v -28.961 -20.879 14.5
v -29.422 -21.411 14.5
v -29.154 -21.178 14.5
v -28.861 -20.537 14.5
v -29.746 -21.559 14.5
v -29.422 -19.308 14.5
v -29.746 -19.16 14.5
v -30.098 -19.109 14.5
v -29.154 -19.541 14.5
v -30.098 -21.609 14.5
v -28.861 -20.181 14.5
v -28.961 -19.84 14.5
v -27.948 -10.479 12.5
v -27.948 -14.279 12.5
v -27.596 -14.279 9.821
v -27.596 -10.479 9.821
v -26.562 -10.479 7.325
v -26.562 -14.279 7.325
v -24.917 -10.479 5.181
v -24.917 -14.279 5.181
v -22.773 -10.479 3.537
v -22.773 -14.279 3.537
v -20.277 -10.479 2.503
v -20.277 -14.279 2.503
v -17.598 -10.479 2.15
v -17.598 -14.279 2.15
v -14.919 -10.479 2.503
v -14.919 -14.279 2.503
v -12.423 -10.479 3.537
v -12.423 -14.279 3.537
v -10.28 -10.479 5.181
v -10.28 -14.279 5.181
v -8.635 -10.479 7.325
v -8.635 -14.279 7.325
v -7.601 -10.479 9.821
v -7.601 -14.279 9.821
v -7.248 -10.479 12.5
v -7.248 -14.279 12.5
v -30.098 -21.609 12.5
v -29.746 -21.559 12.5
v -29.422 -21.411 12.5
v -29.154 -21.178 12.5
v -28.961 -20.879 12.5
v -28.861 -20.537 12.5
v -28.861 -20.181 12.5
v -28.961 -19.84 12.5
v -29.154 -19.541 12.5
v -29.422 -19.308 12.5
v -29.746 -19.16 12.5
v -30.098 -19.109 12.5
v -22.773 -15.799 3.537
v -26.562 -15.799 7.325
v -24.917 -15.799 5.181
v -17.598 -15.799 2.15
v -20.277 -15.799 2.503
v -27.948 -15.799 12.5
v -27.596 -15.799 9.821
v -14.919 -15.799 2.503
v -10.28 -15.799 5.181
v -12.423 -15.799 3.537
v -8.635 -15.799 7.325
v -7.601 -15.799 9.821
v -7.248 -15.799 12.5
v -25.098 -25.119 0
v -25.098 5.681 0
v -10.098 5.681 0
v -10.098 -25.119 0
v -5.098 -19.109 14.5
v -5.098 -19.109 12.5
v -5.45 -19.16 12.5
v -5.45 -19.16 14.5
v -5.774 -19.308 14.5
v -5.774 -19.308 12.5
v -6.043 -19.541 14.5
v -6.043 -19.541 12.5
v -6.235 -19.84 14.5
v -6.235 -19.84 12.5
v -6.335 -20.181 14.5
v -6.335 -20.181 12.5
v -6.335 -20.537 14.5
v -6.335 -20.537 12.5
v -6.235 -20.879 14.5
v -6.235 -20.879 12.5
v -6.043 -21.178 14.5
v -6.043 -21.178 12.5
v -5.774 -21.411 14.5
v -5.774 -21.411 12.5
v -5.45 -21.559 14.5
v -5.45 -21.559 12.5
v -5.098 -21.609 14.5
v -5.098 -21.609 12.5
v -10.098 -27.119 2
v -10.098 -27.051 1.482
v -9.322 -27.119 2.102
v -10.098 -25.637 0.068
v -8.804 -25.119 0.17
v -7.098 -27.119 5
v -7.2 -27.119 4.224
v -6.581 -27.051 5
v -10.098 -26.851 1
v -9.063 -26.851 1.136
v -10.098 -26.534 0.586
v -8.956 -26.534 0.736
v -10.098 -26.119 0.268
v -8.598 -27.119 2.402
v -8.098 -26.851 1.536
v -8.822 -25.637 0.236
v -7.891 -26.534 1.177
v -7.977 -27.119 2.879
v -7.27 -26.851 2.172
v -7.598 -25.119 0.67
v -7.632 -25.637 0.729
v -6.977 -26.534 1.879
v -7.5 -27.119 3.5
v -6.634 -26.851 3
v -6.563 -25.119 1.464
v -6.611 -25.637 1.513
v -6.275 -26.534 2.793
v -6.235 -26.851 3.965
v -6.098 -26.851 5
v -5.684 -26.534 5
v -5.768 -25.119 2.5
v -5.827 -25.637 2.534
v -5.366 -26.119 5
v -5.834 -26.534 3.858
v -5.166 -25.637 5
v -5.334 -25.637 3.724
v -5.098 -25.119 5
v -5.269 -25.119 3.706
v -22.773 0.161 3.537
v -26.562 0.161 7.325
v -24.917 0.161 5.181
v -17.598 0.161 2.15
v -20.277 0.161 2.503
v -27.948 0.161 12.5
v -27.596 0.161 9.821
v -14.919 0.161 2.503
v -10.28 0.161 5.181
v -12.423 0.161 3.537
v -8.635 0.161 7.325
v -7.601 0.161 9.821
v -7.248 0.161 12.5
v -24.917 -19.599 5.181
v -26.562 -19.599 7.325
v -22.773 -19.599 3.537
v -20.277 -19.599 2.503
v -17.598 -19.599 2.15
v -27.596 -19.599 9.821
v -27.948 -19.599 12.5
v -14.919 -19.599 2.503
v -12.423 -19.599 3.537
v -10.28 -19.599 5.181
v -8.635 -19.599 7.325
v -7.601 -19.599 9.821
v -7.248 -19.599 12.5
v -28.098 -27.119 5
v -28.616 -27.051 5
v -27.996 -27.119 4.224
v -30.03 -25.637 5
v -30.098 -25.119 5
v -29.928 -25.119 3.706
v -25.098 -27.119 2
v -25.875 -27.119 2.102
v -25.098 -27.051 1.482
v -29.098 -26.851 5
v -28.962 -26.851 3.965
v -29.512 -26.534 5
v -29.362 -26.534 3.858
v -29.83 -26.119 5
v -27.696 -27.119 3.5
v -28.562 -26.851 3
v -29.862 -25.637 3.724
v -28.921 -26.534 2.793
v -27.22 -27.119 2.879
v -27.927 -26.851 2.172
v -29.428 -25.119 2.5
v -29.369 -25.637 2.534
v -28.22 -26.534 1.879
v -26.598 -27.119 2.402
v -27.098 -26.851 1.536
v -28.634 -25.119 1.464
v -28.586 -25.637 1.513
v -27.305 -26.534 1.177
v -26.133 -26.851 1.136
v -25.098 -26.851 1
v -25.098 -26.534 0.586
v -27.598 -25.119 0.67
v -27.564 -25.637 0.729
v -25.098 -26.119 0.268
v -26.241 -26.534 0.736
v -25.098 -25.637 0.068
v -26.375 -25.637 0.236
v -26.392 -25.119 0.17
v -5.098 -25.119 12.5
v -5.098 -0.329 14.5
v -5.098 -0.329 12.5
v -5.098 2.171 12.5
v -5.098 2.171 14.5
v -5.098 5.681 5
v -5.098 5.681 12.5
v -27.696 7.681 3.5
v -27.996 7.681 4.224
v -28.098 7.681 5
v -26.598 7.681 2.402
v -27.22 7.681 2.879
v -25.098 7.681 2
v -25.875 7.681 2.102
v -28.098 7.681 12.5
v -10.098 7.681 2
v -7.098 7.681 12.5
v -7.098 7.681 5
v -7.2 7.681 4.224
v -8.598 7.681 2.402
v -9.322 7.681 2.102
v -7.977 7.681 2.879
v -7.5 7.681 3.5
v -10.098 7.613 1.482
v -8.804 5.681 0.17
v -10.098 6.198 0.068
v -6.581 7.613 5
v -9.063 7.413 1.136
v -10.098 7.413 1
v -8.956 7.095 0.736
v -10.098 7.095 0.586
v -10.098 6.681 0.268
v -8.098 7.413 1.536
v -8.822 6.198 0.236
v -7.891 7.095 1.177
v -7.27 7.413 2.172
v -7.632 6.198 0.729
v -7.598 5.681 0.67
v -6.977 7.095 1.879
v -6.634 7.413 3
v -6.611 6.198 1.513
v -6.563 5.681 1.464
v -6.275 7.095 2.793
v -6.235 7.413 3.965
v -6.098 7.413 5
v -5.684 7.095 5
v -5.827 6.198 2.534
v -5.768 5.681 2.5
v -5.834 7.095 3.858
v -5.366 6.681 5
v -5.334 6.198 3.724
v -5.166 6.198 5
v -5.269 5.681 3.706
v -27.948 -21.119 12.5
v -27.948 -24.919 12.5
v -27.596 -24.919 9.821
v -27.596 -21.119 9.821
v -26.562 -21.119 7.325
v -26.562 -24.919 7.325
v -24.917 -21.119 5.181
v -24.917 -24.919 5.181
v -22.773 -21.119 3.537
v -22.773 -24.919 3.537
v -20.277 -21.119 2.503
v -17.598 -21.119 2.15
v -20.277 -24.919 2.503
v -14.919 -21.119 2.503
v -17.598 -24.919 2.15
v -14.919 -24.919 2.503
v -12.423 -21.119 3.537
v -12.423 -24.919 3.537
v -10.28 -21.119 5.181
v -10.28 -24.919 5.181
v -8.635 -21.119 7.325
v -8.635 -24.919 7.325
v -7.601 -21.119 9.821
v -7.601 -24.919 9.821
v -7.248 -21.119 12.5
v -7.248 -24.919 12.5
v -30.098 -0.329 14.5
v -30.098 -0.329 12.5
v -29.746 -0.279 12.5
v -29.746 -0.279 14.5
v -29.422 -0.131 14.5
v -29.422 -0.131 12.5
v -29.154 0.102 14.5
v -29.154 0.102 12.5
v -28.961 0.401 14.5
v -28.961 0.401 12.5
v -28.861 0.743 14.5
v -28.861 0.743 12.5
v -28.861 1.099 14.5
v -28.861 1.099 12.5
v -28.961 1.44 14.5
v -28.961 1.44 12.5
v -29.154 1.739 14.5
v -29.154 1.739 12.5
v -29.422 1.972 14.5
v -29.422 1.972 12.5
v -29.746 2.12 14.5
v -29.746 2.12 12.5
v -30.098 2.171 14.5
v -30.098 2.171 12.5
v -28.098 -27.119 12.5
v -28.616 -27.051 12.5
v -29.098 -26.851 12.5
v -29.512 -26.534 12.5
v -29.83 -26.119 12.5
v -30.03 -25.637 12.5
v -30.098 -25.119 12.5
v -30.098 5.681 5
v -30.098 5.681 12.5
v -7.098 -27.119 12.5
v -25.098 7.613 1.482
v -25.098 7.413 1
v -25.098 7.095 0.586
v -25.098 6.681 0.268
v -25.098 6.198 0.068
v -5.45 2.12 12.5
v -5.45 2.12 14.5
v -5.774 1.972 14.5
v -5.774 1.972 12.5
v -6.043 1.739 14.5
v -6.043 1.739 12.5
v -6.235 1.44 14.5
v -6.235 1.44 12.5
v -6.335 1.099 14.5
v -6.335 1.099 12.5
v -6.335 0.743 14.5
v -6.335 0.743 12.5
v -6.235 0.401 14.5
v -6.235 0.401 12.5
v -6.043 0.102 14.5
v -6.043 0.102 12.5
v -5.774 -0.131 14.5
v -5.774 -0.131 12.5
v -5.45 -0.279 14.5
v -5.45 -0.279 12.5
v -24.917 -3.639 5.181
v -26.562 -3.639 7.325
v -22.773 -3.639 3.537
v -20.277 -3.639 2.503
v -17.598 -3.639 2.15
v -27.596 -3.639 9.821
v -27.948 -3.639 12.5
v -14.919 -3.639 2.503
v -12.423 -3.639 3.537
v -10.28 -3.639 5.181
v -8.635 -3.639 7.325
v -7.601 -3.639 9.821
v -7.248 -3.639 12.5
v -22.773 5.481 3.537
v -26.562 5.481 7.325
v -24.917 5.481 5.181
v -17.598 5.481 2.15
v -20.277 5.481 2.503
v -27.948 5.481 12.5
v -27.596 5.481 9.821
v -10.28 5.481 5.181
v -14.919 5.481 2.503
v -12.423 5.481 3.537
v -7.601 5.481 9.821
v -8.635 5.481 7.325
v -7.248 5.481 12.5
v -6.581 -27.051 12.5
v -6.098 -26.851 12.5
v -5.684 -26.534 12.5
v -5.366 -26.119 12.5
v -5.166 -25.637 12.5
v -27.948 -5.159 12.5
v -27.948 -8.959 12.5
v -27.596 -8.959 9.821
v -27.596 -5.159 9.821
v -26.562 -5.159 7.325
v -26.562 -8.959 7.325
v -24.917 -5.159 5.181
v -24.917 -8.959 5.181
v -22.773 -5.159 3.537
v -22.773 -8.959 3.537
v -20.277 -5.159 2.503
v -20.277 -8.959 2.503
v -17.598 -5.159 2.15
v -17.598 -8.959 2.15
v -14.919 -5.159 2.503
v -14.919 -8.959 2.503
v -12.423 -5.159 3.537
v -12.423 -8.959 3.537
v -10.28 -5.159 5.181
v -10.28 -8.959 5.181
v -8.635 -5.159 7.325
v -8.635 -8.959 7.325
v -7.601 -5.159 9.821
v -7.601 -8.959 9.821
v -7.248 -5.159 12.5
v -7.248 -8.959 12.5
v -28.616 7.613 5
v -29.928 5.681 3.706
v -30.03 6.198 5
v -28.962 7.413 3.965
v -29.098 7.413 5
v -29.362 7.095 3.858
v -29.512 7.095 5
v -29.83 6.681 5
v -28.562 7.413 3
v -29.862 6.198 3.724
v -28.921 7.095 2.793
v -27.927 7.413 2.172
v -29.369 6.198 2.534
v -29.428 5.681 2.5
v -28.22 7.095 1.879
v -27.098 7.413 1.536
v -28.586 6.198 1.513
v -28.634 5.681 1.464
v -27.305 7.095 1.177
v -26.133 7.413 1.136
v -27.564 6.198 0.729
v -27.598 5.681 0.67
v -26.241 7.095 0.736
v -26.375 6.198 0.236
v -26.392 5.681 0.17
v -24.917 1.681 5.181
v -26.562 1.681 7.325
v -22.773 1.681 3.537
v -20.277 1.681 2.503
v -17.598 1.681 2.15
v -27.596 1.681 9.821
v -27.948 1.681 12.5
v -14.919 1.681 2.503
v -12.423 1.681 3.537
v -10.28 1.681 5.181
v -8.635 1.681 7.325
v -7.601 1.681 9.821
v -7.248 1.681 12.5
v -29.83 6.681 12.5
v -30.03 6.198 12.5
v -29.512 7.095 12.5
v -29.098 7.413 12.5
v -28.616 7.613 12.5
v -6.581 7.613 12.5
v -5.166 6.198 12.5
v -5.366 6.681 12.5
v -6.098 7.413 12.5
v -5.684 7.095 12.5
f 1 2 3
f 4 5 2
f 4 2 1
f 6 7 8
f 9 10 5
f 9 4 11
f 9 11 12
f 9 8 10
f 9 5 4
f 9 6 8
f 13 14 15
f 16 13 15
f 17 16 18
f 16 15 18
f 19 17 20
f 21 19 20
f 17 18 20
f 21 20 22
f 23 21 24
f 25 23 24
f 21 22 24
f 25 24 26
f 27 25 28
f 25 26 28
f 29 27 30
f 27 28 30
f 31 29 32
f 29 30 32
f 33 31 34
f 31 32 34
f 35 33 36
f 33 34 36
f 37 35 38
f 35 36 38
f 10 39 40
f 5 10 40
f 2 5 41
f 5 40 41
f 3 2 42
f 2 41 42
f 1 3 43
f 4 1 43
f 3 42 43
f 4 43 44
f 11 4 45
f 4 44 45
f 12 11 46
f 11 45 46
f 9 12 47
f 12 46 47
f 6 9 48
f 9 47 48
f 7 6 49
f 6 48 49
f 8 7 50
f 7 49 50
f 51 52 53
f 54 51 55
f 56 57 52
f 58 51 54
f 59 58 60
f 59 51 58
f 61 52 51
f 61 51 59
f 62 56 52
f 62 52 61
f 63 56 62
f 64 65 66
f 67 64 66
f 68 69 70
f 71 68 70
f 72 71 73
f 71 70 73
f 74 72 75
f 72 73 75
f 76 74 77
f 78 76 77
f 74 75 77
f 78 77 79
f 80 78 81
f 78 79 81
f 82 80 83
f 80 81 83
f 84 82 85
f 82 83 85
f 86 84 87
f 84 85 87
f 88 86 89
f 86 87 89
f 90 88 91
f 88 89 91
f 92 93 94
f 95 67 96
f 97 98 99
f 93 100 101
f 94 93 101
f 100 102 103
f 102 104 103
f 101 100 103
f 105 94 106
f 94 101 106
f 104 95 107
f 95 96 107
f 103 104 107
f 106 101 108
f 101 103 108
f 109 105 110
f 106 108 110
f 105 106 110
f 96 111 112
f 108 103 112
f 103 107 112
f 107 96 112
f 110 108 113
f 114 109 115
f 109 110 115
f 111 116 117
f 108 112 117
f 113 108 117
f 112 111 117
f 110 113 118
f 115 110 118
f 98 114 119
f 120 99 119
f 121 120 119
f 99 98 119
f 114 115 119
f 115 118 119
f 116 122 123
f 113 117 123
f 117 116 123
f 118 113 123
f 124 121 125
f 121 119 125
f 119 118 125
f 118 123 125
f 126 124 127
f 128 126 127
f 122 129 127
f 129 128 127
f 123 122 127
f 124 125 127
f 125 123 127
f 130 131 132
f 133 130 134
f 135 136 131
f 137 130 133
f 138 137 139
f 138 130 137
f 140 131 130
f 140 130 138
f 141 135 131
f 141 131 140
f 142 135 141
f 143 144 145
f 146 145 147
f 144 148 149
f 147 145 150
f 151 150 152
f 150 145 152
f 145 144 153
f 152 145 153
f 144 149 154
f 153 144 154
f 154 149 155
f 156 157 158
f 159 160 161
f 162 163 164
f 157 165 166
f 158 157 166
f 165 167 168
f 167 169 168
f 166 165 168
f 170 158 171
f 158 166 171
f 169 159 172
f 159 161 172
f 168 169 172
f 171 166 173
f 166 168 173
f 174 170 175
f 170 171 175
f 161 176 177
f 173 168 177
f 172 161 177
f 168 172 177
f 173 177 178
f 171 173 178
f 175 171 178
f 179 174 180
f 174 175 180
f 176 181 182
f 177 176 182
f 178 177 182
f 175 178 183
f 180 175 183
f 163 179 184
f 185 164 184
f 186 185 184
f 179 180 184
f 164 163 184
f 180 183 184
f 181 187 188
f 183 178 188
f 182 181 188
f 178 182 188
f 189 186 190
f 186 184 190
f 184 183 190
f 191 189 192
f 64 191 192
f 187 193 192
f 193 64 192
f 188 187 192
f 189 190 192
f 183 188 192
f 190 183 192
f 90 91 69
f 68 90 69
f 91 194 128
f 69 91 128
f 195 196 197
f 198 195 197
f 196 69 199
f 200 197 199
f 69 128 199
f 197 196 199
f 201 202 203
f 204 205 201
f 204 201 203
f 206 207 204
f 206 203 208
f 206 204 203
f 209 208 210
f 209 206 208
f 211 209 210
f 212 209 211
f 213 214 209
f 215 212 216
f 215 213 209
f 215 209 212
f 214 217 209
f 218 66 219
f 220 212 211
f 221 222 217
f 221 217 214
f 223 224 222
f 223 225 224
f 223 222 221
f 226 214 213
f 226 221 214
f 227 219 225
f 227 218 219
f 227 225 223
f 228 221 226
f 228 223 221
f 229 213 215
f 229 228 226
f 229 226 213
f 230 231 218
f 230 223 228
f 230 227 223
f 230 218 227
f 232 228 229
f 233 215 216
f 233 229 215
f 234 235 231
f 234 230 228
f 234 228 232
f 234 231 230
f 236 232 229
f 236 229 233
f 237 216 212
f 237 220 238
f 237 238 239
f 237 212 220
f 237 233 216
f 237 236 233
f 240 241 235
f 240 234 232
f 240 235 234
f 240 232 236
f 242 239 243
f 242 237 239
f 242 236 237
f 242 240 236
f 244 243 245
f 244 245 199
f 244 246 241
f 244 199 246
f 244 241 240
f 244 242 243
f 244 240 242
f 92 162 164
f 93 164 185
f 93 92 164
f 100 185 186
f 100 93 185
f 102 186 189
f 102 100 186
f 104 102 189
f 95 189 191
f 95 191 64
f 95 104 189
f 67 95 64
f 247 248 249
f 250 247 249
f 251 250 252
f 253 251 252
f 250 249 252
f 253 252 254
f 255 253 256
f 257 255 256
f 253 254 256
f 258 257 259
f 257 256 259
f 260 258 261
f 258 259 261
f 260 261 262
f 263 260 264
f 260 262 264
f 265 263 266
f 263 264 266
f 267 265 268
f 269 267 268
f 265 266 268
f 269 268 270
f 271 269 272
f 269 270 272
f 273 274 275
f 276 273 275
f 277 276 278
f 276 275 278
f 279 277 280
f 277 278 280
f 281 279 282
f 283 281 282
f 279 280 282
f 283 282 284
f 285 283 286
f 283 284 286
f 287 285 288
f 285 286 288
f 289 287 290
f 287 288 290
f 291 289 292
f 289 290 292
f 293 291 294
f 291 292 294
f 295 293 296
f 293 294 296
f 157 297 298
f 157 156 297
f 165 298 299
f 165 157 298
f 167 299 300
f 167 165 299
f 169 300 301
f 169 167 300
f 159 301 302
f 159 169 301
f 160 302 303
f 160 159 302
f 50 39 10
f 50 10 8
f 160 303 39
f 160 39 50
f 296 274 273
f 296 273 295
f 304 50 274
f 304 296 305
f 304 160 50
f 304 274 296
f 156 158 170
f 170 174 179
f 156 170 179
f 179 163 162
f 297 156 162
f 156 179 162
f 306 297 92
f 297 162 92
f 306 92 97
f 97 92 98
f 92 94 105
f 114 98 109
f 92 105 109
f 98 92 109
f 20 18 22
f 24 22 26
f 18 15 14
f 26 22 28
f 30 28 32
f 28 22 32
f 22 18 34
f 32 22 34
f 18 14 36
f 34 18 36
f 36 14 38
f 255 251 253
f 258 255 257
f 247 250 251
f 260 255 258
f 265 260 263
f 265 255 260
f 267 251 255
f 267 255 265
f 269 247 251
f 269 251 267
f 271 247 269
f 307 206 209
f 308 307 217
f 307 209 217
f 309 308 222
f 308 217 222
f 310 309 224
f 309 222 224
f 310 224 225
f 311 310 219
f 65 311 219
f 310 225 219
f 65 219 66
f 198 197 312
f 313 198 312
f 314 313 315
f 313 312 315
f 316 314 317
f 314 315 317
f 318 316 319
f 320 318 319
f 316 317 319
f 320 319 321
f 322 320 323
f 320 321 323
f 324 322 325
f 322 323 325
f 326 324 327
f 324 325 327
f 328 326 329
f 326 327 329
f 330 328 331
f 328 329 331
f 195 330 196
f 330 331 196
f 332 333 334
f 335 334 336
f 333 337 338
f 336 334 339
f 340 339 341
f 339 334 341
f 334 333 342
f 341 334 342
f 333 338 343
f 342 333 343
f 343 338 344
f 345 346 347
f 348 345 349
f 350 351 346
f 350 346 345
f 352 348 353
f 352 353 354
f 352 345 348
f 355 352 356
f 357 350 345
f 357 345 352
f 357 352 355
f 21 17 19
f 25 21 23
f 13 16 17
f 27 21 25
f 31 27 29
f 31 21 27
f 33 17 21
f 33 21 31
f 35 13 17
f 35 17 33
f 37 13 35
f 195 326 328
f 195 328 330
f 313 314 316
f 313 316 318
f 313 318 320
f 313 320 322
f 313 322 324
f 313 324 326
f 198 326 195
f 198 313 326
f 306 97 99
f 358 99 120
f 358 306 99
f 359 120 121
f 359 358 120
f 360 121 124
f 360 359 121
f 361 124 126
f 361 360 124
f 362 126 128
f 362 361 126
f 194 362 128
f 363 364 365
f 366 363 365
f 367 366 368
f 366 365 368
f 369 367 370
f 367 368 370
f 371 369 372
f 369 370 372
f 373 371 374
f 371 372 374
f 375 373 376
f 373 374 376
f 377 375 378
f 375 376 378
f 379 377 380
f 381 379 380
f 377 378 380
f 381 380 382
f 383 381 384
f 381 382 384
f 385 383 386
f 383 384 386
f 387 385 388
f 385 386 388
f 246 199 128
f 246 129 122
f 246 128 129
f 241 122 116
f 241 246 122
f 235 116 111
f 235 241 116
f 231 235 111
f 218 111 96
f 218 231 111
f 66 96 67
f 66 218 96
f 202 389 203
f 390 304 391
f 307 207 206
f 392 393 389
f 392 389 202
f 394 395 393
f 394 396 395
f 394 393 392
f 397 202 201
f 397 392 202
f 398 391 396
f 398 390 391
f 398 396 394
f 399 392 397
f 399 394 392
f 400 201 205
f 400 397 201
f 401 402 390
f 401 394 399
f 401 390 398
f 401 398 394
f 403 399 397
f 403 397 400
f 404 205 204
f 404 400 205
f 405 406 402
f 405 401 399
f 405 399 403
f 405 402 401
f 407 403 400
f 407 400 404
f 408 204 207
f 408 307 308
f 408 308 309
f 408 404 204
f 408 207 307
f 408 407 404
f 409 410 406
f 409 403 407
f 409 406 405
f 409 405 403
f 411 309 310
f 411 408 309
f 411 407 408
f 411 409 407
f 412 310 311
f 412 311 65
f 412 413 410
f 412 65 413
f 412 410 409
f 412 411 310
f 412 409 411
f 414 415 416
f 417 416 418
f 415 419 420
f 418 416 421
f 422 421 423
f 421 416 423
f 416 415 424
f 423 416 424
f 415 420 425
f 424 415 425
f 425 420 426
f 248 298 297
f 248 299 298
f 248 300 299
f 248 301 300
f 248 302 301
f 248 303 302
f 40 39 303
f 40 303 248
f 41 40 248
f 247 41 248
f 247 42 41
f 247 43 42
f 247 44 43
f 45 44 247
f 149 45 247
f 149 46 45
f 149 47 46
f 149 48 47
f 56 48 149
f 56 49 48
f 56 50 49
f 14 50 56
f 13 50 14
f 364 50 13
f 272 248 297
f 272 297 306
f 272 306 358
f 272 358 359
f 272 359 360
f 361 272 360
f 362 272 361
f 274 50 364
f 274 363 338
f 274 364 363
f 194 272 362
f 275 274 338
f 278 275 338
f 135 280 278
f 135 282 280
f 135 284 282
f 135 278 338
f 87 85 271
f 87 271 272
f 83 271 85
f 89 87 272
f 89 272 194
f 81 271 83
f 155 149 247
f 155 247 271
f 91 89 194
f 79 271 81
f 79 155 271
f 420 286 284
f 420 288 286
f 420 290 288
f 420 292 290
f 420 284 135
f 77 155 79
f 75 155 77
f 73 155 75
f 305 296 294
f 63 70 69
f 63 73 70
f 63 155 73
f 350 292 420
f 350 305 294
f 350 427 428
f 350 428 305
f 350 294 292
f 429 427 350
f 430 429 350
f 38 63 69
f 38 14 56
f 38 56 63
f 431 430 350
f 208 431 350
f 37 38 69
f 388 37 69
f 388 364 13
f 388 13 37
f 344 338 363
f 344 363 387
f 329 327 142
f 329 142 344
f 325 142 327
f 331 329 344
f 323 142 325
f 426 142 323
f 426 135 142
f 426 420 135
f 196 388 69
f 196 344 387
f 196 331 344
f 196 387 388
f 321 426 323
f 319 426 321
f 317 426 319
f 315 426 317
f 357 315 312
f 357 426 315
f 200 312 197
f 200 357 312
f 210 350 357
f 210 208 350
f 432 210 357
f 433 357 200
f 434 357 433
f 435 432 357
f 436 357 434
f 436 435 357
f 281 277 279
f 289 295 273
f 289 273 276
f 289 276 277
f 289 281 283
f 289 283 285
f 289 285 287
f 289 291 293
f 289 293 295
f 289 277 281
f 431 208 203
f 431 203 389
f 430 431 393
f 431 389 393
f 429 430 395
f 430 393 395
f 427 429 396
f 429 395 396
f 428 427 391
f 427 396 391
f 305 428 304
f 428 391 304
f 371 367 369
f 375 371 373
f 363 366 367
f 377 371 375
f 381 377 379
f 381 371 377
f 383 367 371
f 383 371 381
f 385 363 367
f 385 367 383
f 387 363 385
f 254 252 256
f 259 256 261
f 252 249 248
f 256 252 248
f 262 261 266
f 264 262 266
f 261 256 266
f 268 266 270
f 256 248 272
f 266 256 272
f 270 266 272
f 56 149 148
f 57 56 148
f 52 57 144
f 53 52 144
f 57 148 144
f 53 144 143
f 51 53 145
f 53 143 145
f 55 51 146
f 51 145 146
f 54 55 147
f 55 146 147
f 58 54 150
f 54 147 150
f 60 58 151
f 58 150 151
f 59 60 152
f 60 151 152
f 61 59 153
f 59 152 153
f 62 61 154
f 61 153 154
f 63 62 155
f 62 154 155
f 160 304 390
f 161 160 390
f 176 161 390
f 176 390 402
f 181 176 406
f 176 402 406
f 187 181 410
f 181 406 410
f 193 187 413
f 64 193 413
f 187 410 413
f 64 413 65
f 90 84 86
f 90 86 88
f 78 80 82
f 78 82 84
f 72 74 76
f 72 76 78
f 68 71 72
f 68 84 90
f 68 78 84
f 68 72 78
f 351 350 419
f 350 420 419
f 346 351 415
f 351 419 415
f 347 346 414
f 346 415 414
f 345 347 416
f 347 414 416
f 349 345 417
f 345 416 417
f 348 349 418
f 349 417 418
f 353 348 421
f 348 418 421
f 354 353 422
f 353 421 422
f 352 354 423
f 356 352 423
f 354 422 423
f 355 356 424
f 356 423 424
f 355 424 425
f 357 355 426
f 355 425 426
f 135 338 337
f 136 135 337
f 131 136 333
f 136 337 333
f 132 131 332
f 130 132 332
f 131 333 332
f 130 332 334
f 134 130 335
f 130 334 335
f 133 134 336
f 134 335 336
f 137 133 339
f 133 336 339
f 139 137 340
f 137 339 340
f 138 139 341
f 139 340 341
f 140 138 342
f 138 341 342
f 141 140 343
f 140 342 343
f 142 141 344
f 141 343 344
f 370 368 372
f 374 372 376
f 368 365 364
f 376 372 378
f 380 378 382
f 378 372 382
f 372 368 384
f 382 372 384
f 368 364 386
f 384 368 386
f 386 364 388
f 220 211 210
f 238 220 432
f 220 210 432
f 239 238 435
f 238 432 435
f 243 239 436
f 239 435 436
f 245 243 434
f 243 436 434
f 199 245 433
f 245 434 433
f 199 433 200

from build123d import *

# Parameters (mm, degrees)
F0_W     = 25
F0_H     = 34.8
F1_DEPTH = 12.5
F3_START = -2.2
F2_R     = 10.35
F3_DEPTH = 30.4
F4_W     = 20.7
F4_H     = 1.52
F5_DEPTH = 10.6
F6_R     = 5
F7_R     = 2
F9_DEPTH = 2


with BuildPart() as f1:
    # F0 (on Top) → F1 (new body)
    with BuildSketch(Plane.XY):
        with Locations((-17.5982150249, -9.7193448131)):
            Rectangle(F0_W, F0_H)
    extrude(amount=F1_DEPTH)

    # F2 (on face) → F3 (cut)
    with BuildSketch(Plane.XZ.offset(27.1193448131).offset(F3_START)):
        with Locations((-17.5982150249, 12.5)):
            Circle(F2_R)
    extrude(amount=-F3_DEPTH, mode=Mode.SUBTRACT)

    # F4 (on face) → F5 (join)
    with BuildSketch(Plane.XY.offset(12.5)):
        with Locations((-17.5982150249, 0.9206551869)):
            Rectangle(F4_W, F4_H)
        with Locations((-17.5982150249, -4.3993448131)):
            Rectangle(F4_W, F4_H)
        with Locations((-17.5982150249, -9.7193448131)):
            Rectangle(F4_W, F4_H)
        with Locations((-17.5982150249, -15.0393448131)):
            Rectangle(F4_W, F4_H)
        with Locations((-17.5982150249, -20.3593448131)):
            Rectangle(F4_W, F4_H)
    extrude(amount=-F5_DEPTH)

    # F6
    f6_edges = [f1.edges().sort_by_distance(p)[0] for p in [
        (-5.098215, -9.719345, 0),
        (-30.098215, -9.719345, 0),
    ]]
    fillet(f6_edges, radius=F6_R)

    # F7
    f7_edges = [f1.edges().sort_by_distance(p)[0] for p in [
        (-5.098215, -27.119345, 8.75),
        (-5.098215, 7.680655, 8.75),
    ]]
    fillet(f7_edges, radius=F7_R)

    # F8 (on face) → F9 (join)
    with BuildSketch(Plane.XY.offset(12.5)):
        with BuildLine():
            Line((-30.0982150249, 2.1706551869), (-30.0982150249, -0.3293448131))
            ThreePointArc((-30.0982150249, -0.3293448131), (-28.8482150249, 0.9206551869), (-30.0982150249, 2.1706551869))
        make_face()
        with BuildLine():
            Line((-5.0982150249, -0.3293448131), (-5.0982150249, 2.1706551869))
            ThreePointArc((-5.0982150249, 2.1706551869), (-6.3482150249, 0.9206551869), (-5.0982150249, -0.3293448131))
        make_face()
        with BuildLine():
            ThreePointArc((-5.0982150249, -19.1093448131), (-6.3482150249, -20.3593448131), (-5.0982150249, -21.6093448131))
            Line((-5.0982150249, -21.6093448131), (-5.0982150249, -19.1093448131))
        make_face()
        with BuildLine():
            ThreePointArc((-30.0982150249, -21.6093448131), (-28.8482150249, -20.3593448131), (-30.0982150249, -19.1093448131))
            Line((-30.0982150249, -19.1093448131), (-30.0982150249, -21.6093448131))
        make_face()
    extrude(amount=F9_DEPTH)


solid = f1.part
